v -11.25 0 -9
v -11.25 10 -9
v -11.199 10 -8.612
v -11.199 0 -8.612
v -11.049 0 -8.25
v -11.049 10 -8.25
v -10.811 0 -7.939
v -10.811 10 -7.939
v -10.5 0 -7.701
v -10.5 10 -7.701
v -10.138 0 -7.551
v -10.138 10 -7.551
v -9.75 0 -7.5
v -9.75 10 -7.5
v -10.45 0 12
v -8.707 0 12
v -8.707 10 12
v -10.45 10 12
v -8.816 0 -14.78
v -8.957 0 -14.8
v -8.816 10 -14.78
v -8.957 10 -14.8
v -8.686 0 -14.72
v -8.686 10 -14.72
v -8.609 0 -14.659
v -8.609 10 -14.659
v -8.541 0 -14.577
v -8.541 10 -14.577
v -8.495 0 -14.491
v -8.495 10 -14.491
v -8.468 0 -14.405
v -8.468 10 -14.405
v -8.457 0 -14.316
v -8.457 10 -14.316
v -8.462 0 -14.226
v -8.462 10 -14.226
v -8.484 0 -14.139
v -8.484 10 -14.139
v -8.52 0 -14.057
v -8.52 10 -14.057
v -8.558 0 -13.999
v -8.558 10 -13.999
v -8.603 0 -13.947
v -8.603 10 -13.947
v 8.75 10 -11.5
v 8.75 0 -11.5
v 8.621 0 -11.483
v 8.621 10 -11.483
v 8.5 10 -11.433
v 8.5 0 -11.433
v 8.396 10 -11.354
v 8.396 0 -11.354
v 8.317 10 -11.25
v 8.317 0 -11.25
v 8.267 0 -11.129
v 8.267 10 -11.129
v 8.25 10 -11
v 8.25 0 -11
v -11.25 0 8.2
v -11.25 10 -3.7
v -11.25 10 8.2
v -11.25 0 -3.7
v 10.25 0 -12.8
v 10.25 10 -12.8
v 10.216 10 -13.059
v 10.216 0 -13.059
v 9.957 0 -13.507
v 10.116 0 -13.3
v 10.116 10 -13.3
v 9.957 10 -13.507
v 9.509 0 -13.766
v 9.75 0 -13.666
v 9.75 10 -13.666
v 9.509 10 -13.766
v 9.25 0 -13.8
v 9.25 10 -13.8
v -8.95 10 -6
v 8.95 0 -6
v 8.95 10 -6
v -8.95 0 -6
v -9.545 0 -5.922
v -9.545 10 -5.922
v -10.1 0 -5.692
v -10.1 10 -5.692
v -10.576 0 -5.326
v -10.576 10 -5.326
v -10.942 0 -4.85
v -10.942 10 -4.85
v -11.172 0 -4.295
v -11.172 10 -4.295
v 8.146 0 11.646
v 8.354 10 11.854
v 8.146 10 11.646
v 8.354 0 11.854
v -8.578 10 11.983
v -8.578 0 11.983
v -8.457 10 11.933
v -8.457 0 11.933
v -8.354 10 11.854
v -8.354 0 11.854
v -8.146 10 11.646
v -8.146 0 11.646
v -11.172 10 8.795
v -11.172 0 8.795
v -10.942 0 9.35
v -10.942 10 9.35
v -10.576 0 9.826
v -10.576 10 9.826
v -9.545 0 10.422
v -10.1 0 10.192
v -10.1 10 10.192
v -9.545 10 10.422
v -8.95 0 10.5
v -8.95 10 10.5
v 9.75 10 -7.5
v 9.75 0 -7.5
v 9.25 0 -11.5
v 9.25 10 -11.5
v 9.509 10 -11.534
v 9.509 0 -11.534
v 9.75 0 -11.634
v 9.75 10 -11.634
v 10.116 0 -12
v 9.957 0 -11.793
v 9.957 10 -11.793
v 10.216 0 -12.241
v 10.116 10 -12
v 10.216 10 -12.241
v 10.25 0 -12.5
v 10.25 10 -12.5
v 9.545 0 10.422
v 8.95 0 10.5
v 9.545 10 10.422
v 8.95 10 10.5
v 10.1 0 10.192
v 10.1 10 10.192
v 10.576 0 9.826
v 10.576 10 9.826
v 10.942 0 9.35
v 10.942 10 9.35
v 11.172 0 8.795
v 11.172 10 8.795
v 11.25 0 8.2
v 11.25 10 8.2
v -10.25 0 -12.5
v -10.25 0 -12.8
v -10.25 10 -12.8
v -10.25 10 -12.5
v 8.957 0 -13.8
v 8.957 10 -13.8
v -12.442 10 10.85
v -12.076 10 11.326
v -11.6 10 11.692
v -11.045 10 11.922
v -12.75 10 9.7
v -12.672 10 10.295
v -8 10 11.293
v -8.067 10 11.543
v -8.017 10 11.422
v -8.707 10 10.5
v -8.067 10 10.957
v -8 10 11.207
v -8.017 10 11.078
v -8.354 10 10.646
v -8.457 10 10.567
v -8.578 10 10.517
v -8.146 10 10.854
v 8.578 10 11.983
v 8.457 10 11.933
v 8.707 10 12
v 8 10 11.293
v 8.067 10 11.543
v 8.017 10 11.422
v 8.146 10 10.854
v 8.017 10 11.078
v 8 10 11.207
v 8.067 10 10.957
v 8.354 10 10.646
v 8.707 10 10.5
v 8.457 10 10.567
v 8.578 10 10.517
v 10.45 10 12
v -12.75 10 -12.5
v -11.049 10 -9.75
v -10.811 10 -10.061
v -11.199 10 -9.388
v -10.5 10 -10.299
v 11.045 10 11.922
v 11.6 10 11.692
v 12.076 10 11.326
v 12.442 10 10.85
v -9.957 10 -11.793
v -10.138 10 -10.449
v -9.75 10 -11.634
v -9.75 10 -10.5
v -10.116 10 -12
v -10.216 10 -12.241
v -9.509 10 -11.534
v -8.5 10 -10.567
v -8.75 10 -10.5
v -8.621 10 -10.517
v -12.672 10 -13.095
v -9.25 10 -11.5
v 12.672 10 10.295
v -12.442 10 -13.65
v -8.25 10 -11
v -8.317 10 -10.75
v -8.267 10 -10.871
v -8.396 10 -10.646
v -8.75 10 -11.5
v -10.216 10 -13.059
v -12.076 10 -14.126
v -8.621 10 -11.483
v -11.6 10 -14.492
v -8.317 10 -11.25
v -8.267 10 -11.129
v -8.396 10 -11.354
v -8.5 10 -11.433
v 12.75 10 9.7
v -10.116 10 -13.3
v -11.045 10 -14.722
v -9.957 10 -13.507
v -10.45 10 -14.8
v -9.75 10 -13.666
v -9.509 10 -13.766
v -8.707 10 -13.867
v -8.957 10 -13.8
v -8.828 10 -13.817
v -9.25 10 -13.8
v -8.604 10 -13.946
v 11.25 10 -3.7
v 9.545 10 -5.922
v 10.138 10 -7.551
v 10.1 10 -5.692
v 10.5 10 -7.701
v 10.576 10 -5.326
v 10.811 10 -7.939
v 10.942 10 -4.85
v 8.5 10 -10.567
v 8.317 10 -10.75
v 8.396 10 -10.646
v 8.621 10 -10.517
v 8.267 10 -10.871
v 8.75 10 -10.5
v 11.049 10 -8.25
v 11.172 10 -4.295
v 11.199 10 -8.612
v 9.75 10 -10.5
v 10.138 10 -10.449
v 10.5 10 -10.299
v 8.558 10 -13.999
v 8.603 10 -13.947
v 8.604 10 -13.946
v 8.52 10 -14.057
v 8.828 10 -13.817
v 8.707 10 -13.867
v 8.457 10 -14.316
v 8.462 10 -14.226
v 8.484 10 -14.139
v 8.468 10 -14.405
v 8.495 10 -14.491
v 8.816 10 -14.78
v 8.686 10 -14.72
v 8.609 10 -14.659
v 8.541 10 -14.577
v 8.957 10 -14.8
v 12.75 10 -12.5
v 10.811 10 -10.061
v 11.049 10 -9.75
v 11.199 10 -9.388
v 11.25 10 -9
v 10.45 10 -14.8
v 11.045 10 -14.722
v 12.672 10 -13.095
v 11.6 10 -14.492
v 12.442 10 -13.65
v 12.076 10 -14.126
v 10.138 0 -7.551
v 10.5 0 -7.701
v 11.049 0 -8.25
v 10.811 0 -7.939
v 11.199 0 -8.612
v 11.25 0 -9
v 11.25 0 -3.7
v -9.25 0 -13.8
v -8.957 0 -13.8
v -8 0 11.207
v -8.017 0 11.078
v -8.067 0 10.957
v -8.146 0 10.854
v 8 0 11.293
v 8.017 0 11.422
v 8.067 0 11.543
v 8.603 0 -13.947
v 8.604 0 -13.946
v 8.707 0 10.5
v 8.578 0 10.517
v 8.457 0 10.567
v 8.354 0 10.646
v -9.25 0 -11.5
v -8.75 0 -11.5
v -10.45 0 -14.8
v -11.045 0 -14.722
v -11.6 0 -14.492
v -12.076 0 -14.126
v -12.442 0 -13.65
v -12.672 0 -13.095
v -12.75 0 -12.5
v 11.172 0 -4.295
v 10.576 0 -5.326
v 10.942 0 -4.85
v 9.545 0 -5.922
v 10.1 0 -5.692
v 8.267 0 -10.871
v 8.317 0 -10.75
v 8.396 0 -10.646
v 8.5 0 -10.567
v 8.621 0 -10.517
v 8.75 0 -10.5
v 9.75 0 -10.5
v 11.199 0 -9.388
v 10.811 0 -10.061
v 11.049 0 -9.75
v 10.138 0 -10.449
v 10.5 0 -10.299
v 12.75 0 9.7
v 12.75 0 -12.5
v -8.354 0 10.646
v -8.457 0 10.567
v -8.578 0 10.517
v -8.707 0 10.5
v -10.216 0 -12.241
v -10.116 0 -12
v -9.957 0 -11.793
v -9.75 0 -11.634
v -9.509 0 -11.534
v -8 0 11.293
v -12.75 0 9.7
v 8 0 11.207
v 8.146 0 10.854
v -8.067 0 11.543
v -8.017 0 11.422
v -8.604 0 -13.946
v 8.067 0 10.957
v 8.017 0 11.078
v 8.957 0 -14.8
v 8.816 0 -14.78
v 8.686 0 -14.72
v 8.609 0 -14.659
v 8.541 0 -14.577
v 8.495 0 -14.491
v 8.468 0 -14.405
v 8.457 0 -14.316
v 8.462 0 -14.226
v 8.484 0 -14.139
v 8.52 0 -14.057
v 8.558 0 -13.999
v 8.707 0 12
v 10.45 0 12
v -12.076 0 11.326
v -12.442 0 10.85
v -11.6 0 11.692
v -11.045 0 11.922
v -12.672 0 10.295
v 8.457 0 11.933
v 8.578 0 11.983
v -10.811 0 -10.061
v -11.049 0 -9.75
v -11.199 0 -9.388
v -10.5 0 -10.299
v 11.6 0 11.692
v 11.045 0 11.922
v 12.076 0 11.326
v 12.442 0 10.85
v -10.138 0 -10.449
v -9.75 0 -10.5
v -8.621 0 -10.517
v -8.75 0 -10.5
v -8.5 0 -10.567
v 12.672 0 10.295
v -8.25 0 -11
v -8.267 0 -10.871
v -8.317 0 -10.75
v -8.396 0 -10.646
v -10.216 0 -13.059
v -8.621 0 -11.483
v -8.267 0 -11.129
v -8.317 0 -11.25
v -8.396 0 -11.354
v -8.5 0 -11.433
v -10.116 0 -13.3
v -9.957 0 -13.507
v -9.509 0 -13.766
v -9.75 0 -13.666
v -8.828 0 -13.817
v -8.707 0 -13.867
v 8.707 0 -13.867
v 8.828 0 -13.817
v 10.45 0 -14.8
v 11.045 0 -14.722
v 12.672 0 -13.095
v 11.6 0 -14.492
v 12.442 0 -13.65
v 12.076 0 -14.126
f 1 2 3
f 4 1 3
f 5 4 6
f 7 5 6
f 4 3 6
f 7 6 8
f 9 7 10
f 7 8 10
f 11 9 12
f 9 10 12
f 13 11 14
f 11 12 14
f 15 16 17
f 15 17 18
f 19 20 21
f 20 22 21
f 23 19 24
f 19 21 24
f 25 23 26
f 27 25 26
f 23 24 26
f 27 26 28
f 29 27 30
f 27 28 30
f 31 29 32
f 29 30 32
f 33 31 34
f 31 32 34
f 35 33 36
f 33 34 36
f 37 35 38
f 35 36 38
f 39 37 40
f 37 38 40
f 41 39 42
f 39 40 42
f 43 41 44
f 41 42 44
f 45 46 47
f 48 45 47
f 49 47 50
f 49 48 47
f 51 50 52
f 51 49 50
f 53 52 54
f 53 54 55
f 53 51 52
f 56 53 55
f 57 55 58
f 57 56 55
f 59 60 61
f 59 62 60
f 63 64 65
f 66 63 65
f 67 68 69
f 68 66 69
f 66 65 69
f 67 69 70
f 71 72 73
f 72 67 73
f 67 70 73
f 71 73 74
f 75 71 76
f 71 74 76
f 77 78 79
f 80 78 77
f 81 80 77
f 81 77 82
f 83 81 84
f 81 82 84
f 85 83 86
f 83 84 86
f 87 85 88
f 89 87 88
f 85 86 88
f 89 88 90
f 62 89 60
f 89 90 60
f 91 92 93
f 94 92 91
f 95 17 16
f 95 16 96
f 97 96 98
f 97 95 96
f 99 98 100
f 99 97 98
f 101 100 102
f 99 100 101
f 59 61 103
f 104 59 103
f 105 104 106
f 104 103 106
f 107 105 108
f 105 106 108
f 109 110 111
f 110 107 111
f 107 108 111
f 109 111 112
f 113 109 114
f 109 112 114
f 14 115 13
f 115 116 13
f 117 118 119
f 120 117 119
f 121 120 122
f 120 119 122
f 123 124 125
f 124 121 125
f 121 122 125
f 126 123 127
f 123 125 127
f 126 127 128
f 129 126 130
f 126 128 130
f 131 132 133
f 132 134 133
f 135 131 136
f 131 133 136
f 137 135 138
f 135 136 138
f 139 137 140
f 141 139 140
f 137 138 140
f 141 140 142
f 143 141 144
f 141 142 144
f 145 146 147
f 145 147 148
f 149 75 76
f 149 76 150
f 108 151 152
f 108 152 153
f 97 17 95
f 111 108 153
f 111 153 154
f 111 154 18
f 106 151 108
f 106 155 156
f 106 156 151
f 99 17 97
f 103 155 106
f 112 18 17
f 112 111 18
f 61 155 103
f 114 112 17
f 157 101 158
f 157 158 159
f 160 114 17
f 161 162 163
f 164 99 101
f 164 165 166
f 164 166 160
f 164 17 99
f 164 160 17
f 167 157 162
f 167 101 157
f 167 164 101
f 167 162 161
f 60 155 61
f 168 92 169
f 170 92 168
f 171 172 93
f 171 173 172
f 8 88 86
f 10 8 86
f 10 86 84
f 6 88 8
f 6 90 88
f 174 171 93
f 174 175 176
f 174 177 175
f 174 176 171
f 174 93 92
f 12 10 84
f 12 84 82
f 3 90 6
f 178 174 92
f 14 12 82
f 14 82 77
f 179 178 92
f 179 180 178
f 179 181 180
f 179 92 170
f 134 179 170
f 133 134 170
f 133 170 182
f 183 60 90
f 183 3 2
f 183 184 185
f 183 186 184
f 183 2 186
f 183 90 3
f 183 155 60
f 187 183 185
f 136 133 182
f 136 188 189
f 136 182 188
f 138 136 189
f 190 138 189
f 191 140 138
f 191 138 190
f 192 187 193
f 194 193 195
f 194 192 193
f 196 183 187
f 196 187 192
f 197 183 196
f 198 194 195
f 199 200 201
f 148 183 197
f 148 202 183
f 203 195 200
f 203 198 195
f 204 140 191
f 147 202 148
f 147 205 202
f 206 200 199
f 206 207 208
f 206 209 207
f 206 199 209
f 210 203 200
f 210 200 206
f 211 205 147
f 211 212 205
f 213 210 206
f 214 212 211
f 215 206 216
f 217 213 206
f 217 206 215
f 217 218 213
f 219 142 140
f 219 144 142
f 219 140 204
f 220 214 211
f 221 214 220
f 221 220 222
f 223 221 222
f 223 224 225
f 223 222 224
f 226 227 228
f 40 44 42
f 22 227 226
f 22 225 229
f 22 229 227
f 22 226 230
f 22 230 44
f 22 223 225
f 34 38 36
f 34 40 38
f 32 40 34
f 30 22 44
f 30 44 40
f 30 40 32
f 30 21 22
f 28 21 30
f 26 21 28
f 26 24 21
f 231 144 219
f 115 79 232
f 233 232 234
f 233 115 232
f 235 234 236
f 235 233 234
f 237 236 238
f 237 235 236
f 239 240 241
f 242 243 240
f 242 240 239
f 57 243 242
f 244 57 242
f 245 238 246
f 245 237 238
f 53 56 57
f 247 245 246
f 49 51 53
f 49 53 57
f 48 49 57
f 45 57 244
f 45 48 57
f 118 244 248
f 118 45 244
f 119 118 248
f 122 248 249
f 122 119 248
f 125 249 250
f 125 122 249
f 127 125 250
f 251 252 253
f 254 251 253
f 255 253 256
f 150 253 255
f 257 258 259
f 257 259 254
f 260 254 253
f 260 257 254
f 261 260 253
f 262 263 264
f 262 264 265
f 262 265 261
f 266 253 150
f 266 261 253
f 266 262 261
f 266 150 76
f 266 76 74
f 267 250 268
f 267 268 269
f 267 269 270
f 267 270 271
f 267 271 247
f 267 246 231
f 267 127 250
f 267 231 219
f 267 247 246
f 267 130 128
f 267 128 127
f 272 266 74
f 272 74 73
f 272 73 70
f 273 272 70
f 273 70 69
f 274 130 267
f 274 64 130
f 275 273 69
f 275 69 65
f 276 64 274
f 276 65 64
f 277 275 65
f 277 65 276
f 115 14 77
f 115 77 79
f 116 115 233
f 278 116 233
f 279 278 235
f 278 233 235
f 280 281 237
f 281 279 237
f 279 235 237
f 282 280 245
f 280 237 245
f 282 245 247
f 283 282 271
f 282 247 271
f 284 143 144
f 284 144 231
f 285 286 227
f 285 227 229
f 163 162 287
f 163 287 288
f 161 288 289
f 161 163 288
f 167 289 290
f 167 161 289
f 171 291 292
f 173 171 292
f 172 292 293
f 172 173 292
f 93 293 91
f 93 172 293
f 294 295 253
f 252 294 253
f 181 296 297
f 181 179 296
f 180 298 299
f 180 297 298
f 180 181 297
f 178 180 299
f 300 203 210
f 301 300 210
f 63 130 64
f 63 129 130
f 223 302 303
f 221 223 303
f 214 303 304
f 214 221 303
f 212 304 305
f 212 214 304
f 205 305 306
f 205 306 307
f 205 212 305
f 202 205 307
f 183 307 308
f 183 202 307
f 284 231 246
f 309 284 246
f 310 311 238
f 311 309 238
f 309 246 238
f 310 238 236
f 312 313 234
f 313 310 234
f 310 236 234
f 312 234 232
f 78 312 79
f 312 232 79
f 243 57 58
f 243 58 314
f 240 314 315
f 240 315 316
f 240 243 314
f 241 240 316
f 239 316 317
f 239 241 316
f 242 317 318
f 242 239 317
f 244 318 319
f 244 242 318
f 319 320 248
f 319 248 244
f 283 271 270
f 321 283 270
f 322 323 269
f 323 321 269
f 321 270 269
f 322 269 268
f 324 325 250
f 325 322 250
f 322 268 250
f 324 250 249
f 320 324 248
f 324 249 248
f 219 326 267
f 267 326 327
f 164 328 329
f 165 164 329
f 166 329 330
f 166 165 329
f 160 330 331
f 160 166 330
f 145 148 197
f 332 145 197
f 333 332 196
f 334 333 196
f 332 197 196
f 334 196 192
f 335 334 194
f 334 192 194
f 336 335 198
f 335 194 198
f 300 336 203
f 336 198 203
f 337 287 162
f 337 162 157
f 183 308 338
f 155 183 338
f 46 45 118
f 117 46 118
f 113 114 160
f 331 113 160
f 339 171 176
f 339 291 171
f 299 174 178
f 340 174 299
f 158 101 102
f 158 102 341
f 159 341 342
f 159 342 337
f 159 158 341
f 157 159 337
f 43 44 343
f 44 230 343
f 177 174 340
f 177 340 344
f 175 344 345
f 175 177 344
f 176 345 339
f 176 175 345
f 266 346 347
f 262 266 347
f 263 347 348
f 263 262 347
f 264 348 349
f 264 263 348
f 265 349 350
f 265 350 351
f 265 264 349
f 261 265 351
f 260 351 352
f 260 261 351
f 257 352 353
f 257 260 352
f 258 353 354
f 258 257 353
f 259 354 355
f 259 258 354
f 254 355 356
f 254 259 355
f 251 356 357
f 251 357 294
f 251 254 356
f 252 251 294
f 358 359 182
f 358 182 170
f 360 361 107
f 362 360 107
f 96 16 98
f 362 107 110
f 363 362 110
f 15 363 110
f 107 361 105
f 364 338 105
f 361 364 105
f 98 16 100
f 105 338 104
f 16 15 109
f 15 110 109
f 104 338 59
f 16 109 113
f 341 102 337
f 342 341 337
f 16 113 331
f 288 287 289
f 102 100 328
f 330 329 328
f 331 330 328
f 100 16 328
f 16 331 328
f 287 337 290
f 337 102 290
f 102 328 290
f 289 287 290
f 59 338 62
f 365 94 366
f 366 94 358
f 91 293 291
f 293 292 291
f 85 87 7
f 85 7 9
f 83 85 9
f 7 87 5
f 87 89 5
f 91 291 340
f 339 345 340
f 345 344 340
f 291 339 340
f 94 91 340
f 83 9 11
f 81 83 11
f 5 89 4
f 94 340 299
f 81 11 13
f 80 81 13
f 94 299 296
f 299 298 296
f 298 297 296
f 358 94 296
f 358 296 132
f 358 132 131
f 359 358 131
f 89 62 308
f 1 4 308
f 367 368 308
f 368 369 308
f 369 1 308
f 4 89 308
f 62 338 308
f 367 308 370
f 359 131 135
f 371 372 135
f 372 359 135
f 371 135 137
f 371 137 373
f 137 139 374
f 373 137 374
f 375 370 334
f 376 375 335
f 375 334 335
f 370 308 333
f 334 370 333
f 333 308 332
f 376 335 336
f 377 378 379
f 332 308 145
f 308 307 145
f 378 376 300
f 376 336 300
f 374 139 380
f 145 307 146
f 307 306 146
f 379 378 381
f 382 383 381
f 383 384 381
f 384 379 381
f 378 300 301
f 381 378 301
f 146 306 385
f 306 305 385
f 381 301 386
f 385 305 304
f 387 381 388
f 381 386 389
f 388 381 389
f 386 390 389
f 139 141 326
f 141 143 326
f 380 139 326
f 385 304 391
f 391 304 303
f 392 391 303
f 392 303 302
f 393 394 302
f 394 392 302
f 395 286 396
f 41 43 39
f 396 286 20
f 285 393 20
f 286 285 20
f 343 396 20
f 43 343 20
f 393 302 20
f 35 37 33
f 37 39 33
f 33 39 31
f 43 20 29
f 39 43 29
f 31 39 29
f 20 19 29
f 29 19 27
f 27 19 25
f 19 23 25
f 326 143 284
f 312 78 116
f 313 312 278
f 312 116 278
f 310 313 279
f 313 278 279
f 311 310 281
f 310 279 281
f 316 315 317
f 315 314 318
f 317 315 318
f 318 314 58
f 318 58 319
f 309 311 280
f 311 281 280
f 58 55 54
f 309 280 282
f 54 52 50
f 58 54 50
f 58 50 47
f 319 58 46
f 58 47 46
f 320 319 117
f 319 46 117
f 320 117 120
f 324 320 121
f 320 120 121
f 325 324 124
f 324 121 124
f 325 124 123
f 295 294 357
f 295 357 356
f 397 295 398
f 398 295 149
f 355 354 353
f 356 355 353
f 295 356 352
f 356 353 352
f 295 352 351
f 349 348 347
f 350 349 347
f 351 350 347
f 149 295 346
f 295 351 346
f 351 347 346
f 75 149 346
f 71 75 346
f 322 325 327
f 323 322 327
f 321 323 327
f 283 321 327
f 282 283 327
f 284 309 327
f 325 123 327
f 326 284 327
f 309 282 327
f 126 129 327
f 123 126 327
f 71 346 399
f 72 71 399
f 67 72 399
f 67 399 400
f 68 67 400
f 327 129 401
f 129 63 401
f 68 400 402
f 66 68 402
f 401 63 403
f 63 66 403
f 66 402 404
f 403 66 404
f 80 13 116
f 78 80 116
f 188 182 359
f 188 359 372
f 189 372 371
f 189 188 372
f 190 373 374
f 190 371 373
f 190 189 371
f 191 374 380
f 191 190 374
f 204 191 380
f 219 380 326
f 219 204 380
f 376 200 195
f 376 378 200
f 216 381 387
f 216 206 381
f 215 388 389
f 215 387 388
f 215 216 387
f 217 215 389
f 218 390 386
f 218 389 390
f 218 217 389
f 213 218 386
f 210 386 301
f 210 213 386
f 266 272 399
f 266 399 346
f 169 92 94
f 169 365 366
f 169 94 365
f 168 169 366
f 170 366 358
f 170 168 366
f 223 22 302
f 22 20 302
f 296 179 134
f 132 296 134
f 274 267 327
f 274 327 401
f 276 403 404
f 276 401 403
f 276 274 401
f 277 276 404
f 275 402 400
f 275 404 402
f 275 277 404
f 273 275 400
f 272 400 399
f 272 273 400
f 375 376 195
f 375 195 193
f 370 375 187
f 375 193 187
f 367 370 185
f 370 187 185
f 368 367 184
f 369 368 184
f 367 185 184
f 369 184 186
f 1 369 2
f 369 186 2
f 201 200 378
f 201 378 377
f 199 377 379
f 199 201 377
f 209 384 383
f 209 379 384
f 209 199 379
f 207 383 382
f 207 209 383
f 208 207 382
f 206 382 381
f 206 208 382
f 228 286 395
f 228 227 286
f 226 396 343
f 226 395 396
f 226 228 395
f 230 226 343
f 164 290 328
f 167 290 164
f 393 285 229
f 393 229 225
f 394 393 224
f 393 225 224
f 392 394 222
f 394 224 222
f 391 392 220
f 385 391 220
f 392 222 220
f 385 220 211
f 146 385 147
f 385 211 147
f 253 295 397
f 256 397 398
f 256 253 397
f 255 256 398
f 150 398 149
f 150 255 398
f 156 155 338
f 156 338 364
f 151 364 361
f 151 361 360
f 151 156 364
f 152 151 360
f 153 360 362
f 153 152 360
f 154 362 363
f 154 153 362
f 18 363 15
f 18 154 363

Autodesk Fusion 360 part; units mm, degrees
sketch "Sketch1" plane through (0, 0, 0) normal (0, 1, 0) x (1, 0, 0)
  line L0 (-8.25, 14.8) -> (-12.75, 14.8)
  line L1 (-12.75, 14.8) -> (-8.25, 14.8)
  line L2 (-8.25, 13.8) -> (-10.25, 13.8)
  line L3 (-11.25, -10.5) -> (-8, -10.5)
  line L4 (-8, -10.5) -> (-8, -12)
  line L5 (-8, -12) -> (-12.75, -12)
  line L6 (-8.25, 13.8) -> (-8.25, 14.8)
  line L7 (-10.25, 13.8) -> (-10.25, 11.5)
  line L8 (-10.25, 11.5) -> (-8.25, 11.5)
  line L9 (-8.25, 11.5) -> (-8.25, 10.5)
  line L10 (-8.25, 10.5) -> (-11.25, 10.5)
  line L11 (-12.75, 14.8) -> (-12.75, -12)
  line L12 (0, 7.5) -> (-11.25, 7.5)
  line L13 (-11.25, 7.5) -> (-11.25, 10.5)
  line L14 (0, 7.5) -> (0, 6)
  line L15 (0, 6) -> (-11.25, 6)
  line L16 (-11.25, 6) -> (-11.25, -10.5)
  dimension "d1" = 2.3
  dimension "d2" = 1
  dimension "d3" = 1
  dimension "d5" = 2
  dimension "d8" = 1.5
  dimension "d11" = 8
  dimension "d13" = 10.5
  dimension "d14" = 10.5
  dimension "d17" = 1
  dimension "d28" = 1.5
  dimension "d29" = 1.5
  dimension "d30" = 3
  dimension "d34" = 10.25
extrude "Extrude1" add sketch "Sketch1" along normal blind 10 makes body 1
chamfer "Chamfer1" distance 0.5 angle 45 3 edges at (-8.25, 5, -13.8) (-8, 5, 12) (-8, 5, 10.5) on bodies 1
fillet "Fillet1" radius 0.5 6 edges at (-8, 5, 11.5) (-8, 5, 11) (-8.5, 5, 12) (-8.5, 5, 10.5) (-8.25, 5, -14.3) (-8.75, 5, -13.8) on bodies 1
fillet "Fillet2" radius 2.3 4 edges at (-12.75, 5, 12) (-12.75, 5, -14.8) (-11.25, 5, -6) (-11.25, 5, 10.5) on bodies 1
fillet "Fillet3" radius 0.5 3 edges at (-8.25, 5, -14.8) (-8.25, 5, -11.5) (-8.25, 5, -10.5) on bodies 1
fillet "Fillet4" radius 1 2 edges at (-10.25, 5, -13.8) (-10.25, 5, -11.5) on bodies 1
fillet "Fillet5" radius 1.5 2 edges at (-11.25, 5, -10.5) (-11.25, 5, -7.5) on bodies 1
mirror "Mirror1" about plane through (0, 0, -7.5) normal (1, 0, 0) of bodies 1 makes body 2
combine "Combine1" operation add target body 1 tool bodies 2
